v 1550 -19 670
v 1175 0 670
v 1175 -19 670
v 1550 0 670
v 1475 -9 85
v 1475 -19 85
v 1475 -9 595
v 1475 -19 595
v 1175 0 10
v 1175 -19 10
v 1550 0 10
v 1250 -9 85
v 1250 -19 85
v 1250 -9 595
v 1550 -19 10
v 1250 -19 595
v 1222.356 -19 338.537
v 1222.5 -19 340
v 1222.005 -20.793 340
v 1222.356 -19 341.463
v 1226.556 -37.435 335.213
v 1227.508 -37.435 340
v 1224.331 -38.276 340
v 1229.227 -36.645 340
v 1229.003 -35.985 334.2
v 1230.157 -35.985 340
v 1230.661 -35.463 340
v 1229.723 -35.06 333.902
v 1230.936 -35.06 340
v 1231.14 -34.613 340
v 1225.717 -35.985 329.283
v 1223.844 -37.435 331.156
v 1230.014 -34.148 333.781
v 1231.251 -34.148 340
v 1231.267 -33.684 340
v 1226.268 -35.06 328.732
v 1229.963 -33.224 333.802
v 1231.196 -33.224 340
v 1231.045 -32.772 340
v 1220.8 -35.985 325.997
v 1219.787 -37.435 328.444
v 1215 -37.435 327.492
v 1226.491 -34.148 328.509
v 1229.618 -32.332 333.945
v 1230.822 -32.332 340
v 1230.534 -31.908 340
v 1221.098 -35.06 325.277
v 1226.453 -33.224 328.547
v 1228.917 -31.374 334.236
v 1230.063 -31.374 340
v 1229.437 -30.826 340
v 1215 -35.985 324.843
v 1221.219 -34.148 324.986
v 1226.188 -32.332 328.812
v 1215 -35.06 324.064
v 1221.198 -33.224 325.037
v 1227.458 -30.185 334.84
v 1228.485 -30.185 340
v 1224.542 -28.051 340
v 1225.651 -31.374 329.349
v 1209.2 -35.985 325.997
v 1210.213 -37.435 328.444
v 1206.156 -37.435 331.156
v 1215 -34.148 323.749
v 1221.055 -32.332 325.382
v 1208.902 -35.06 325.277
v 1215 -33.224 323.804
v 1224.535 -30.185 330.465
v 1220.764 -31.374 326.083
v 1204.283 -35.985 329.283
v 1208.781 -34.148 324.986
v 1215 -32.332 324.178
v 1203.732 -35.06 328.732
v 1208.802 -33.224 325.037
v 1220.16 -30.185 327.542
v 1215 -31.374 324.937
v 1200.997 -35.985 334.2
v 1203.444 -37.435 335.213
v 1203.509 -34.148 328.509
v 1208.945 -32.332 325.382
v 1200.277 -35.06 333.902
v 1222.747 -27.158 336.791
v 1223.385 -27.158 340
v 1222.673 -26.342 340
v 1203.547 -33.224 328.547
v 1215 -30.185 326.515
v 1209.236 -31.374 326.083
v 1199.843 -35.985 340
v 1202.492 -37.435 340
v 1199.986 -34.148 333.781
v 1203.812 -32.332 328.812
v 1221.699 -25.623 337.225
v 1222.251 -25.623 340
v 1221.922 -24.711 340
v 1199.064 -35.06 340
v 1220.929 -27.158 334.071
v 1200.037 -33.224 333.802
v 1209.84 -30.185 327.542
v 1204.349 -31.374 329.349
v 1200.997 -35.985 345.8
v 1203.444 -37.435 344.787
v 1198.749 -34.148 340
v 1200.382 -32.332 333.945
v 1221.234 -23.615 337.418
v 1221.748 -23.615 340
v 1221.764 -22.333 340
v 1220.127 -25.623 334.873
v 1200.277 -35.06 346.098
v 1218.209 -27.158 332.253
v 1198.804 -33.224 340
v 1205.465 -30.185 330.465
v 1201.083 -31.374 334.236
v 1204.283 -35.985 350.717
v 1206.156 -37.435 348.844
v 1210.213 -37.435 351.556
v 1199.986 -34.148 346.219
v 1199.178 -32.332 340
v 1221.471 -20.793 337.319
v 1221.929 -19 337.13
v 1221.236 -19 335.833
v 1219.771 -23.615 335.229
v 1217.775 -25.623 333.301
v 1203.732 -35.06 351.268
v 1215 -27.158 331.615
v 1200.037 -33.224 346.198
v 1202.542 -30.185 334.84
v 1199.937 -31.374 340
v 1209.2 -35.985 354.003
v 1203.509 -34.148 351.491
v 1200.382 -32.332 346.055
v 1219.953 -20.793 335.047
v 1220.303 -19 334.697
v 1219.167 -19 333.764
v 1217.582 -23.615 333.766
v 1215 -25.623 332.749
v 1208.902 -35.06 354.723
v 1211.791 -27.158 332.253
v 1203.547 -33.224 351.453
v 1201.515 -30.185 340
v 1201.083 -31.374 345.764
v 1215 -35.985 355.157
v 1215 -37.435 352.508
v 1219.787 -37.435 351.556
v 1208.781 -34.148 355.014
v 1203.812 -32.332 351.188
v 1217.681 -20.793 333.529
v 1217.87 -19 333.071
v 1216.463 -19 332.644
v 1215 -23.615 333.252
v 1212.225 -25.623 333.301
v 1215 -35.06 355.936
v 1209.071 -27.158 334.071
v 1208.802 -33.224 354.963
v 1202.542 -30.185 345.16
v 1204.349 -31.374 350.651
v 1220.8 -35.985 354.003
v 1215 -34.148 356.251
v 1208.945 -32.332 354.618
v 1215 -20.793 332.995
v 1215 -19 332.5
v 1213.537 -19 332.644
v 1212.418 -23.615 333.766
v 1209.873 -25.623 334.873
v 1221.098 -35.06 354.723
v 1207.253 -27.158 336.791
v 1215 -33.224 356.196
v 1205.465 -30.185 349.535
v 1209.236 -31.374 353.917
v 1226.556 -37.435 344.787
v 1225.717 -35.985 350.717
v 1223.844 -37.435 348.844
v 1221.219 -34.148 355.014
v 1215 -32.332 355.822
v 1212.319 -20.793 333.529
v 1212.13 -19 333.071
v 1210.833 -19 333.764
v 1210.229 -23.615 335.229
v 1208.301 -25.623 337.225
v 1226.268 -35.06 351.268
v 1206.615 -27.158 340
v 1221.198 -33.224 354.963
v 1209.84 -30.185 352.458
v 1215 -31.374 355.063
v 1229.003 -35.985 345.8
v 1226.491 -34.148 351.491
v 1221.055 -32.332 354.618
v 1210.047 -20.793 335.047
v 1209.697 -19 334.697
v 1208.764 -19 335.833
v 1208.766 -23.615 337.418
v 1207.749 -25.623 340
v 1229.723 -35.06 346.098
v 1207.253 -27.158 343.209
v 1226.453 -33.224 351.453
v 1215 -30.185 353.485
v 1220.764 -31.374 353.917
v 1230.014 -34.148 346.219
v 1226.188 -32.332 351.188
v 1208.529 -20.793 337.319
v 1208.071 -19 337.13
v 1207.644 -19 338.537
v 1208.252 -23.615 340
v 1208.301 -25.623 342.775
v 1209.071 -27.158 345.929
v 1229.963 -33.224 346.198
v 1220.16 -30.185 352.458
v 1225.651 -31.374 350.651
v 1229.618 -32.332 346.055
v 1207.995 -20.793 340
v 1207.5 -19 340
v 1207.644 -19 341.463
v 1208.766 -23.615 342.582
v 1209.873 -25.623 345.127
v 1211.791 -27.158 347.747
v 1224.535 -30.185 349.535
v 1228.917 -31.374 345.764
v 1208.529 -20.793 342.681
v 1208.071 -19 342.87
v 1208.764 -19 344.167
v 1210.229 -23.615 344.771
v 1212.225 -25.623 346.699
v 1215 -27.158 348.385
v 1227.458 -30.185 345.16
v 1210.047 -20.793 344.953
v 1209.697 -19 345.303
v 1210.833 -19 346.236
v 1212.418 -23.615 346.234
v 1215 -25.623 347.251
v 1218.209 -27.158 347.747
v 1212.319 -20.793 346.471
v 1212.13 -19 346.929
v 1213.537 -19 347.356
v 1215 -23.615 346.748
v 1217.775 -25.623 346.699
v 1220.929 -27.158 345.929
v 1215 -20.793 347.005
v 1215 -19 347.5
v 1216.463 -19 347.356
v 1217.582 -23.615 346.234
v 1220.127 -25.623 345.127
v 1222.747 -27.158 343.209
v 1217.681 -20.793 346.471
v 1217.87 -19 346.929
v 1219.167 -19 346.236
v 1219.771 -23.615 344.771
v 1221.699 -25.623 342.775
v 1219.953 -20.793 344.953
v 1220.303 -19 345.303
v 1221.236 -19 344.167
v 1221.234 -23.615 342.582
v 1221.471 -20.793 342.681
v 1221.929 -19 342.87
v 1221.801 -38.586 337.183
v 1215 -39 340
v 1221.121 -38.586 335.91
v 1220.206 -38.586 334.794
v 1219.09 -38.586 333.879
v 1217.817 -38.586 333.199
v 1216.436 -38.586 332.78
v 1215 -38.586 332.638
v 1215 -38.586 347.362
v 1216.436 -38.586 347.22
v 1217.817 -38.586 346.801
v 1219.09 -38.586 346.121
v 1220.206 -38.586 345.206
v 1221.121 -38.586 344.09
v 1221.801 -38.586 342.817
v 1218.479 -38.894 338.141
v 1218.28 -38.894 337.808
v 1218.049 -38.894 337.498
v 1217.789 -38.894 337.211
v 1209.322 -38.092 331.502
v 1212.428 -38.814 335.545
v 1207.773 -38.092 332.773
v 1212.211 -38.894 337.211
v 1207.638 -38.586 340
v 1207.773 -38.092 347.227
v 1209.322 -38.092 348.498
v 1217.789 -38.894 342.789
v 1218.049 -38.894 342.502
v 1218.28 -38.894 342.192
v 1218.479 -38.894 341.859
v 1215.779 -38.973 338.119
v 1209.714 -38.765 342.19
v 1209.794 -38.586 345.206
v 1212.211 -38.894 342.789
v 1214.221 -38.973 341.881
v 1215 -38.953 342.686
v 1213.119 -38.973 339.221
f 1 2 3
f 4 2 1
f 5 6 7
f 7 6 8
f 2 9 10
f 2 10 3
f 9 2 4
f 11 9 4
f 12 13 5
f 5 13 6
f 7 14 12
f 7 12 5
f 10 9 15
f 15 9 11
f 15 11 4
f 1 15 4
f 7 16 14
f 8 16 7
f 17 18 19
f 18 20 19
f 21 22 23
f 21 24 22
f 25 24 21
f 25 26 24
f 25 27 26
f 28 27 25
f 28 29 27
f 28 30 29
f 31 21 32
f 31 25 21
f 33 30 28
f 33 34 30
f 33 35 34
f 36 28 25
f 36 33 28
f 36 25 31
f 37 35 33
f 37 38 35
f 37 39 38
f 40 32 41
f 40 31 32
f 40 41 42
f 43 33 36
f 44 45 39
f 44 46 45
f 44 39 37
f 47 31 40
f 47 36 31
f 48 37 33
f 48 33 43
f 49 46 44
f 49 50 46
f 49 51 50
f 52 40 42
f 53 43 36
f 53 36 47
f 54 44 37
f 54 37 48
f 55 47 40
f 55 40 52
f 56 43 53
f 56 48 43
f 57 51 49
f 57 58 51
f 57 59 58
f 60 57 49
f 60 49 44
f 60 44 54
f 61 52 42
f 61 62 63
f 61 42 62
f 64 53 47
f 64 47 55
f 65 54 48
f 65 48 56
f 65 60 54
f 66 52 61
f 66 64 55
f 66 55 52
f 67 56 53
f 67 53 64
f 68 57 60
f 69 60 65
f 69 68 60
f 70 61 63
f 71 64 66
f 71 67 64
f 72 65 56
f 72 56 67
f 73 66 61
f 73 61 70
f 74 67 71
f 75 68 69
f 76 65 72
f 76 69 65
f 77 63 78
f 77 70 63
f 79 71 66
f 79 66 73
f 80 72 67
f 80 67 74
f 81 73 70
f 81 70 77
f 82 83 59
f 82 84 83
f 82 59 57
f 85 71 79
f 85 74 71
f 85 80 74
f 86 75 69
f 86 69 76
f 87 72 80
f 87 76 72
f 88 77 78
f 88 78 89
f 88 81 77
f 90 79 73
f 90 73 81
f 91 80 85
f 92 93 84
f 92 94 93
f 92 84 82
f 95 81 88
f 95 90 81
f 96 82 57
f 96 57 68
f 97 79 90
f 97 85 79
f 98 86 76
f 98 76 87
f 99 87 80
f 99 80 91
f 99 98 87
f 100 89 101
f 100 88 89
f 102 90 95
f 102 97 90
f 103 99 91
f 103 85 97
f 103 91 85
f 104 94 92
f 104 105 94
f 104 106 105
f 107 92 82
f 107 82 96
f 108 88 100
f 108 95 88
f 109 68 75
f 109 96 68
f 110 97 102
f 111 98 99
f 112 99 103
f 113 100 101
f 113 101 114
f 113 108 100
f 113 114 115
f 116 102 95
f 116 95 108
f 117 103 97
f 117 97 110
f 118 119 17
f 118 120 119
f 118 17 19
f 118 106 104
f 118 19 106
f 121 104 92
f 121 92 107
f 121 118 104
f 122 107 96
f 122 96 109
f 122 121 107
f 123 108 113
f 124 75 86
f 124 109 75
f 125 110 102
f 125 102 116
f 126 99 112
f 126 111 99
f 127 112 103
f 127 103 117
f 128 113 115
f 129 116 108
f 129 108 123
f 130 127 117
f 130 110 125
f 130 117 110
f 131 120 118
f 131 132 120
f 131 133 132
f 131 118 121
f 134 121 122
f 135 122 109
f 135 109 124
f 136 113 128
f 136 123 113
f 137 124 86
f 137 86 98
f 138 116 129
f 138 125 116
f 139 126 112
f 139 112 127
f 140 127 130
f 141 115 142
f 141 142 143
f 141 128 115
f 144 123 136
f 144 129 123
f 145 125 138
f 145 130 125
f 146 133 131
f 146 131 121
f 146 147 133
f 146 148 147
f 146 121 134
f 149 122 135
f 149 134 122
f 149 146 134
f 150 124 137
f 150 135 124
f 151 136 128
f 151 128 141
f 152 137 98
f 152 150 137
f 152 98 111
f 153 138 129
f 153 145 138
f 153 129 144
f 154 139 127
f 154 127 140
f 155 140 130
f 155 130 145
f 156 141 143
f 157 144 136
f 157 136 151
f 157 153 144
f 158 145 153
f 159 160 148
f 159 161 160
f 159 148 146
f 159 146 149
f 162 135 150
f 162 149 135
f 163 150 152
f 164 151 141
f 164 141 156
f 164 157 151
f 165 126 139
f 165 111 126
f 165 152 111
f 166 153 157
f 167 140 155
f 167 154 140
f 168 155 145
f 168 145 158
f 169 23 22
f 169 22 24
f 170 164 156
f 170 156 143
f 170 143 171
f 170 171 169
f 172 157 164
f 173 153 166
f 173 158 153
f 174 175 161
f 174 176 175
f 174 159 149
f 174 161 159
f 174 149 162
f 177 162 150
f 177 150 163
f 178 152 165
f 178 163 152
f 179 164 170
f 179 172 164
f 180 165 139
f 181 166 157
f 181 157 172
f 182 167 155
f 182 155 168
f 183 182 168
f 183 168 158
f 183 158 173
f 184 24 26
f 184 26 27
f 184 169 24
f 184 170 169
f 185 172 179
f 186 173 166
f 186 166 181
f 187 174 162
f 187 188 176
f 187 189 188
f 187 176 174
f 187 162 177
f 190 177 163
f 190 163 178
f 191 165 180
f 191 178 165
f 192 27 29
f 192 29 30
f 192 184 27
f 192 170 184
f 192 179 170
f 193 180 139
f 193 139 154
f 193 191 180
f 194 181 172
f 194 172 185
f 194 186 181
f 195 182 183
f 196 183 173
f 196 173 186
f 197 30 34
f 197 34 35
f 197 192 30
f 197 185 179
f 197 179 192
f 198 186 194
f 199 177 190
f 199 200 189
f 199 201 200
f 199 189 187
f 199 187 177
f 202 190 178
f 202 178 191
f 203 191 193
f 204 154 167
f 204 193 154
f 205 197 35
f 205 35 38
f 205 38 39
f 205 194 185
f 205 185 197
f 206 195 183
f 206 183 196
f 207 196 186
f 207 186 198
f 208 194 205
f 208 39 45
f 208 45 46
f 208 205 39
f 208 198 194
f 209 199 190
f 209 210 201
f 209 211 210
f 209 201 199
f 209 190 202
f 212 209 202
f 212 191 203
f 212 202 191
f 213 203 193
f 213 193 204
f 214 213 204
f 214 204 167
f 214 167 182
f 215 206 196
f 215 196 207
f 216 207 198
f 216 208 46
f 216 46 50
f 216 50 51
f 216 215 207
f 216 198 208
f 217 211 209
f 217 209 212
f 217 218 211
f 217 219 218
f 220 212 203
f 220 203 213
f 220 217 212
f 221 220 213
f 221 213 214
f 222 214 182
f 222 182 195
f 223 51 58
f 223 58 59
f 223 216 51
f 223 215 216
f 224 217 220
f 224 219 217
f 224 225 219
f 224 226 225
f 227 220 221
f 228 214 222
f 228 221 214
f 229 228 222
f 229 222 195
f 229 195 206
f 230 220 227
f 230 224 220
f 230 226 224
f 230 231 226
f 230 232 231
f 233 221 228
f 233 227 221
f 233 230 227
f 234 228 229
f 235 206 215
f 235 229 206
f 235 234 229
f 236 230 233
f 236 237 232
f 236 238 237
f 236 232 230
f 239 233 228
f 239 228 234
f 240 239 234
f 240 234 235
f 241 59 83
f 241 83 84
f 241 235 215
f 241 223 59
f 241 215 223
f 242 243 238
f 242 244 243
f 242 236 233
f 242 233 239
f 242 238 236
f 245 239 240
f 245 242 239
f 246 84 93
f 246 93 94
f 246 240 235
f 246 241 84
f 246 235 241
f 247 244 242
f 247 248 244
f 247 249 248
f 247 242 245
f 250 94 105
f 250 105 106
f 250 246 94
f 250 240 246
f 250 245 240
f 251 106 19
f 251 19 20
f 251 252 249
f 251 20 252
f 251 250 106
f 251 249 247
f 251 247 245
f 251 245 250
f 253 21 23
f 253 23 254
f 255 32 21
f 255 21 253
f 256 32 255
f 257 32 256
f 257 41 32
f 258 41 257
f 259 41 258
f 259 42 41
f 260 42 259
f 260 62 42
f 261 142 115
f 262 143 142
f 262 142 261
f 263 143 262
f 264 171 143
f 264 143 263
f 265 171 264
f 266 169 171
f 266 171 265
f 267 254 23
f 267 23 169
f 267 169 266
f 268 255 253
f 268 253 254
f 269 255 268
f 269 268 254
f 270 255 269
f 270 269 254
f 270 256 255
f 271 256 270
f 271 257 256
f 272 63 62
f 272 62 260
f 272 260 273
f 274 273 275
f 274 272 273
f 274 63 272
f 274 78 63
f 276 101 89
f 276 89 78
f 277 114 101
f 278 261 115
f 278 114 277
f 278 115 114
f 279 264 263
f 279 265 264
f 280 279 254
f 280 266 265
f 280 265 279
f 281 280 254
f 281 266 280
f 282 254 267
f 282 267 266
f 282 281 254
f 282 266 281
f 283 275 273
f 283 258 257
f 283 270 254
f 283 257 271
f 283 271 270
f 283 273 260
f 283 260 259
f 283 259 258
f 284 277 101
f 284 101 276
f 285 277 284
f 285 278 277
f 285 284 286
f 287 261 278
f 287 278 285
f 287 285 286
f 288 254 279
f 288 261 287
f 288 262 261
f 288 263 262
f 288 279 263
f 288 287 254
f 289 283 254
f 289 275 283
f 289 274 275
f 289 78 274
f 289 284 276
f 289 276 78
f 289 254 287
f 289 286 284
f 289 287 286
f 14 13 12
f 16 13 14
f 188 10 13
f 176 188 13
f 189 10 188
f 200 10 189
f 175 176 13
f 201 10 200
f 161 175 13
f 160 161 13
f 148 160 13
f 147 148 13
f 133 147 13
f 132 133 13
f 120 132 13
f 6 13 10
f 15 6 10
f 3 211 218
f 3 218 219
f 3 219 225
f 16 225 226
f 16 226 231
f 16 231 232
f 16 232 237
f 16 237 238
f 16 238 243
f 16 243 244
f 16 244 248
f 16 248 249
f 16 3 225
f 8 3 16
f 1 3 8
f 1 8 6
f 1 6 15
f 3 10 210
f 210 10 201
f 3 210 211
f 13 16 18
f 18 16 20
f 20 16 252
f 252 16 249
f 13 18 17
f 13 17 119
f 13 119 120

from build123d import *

# Parameters (mm, degrees)
CLONE2D002_W    = 375
CLONE2D002_H    = 660
PAD011_DEPTH    = 19
SKETCH027_W     = 225
SKETCH027_H     = 510
POCKET011_DEPTH = 10


with BuildPart() as part:
    # Clone2D002 → Pad011 (new body)
    with BuildSketch(Plane.XZ):
        with Locations((187.5, 330)):
            Rectangle(CLONE2D002_W, CLONE2D002_H)
    extrude(amount=PAD011_DEPTH)

    # Sketch027 (on Face6 of Pad011) → Pocket011 (cut)
    with BuildSketch(Plane.XZ.offset(19)):
        with Locations((187.5, 330)):
            Rectangle(SKETCH027_W, SKETCH027_H)
    extrude(amount=-POCKET011_DEPTH, mode=Mode.SUBTRACT)

    # Clone2D003 (on Face1 of Pocket011) → Revolution001 (revolve)
    with BuildSketch(Plane(origin=(40, -19, 330), x_dir=(-1, 0, 0), z_dir=(0, 0, -1))):
        with BuildLine():
            Line((0, 0), (0, -20))
            add(Edge.make_bspline(
                [(0, -20), (-18, -20), (-18, -9.133286), (-4.506424, -9.133286), (-7.5, 0)],
                knots=[0, 0, 0, 0, 0.5, 1, 1, 1, 1], degree=3, weights=[7, 6.116989, 5.810816, 6.060123, 5.999522]))
            Line((-7.5, 0), (0, 0))
        make_face()
    revolve(axis=Axis((40, -19, 330), (0, 1, 0)))


with BuildPart() as part_1:
    # Body011 placement: moved
    add(part.part.moved(Location((1175, 0, 10))))


solid = part_1.part
